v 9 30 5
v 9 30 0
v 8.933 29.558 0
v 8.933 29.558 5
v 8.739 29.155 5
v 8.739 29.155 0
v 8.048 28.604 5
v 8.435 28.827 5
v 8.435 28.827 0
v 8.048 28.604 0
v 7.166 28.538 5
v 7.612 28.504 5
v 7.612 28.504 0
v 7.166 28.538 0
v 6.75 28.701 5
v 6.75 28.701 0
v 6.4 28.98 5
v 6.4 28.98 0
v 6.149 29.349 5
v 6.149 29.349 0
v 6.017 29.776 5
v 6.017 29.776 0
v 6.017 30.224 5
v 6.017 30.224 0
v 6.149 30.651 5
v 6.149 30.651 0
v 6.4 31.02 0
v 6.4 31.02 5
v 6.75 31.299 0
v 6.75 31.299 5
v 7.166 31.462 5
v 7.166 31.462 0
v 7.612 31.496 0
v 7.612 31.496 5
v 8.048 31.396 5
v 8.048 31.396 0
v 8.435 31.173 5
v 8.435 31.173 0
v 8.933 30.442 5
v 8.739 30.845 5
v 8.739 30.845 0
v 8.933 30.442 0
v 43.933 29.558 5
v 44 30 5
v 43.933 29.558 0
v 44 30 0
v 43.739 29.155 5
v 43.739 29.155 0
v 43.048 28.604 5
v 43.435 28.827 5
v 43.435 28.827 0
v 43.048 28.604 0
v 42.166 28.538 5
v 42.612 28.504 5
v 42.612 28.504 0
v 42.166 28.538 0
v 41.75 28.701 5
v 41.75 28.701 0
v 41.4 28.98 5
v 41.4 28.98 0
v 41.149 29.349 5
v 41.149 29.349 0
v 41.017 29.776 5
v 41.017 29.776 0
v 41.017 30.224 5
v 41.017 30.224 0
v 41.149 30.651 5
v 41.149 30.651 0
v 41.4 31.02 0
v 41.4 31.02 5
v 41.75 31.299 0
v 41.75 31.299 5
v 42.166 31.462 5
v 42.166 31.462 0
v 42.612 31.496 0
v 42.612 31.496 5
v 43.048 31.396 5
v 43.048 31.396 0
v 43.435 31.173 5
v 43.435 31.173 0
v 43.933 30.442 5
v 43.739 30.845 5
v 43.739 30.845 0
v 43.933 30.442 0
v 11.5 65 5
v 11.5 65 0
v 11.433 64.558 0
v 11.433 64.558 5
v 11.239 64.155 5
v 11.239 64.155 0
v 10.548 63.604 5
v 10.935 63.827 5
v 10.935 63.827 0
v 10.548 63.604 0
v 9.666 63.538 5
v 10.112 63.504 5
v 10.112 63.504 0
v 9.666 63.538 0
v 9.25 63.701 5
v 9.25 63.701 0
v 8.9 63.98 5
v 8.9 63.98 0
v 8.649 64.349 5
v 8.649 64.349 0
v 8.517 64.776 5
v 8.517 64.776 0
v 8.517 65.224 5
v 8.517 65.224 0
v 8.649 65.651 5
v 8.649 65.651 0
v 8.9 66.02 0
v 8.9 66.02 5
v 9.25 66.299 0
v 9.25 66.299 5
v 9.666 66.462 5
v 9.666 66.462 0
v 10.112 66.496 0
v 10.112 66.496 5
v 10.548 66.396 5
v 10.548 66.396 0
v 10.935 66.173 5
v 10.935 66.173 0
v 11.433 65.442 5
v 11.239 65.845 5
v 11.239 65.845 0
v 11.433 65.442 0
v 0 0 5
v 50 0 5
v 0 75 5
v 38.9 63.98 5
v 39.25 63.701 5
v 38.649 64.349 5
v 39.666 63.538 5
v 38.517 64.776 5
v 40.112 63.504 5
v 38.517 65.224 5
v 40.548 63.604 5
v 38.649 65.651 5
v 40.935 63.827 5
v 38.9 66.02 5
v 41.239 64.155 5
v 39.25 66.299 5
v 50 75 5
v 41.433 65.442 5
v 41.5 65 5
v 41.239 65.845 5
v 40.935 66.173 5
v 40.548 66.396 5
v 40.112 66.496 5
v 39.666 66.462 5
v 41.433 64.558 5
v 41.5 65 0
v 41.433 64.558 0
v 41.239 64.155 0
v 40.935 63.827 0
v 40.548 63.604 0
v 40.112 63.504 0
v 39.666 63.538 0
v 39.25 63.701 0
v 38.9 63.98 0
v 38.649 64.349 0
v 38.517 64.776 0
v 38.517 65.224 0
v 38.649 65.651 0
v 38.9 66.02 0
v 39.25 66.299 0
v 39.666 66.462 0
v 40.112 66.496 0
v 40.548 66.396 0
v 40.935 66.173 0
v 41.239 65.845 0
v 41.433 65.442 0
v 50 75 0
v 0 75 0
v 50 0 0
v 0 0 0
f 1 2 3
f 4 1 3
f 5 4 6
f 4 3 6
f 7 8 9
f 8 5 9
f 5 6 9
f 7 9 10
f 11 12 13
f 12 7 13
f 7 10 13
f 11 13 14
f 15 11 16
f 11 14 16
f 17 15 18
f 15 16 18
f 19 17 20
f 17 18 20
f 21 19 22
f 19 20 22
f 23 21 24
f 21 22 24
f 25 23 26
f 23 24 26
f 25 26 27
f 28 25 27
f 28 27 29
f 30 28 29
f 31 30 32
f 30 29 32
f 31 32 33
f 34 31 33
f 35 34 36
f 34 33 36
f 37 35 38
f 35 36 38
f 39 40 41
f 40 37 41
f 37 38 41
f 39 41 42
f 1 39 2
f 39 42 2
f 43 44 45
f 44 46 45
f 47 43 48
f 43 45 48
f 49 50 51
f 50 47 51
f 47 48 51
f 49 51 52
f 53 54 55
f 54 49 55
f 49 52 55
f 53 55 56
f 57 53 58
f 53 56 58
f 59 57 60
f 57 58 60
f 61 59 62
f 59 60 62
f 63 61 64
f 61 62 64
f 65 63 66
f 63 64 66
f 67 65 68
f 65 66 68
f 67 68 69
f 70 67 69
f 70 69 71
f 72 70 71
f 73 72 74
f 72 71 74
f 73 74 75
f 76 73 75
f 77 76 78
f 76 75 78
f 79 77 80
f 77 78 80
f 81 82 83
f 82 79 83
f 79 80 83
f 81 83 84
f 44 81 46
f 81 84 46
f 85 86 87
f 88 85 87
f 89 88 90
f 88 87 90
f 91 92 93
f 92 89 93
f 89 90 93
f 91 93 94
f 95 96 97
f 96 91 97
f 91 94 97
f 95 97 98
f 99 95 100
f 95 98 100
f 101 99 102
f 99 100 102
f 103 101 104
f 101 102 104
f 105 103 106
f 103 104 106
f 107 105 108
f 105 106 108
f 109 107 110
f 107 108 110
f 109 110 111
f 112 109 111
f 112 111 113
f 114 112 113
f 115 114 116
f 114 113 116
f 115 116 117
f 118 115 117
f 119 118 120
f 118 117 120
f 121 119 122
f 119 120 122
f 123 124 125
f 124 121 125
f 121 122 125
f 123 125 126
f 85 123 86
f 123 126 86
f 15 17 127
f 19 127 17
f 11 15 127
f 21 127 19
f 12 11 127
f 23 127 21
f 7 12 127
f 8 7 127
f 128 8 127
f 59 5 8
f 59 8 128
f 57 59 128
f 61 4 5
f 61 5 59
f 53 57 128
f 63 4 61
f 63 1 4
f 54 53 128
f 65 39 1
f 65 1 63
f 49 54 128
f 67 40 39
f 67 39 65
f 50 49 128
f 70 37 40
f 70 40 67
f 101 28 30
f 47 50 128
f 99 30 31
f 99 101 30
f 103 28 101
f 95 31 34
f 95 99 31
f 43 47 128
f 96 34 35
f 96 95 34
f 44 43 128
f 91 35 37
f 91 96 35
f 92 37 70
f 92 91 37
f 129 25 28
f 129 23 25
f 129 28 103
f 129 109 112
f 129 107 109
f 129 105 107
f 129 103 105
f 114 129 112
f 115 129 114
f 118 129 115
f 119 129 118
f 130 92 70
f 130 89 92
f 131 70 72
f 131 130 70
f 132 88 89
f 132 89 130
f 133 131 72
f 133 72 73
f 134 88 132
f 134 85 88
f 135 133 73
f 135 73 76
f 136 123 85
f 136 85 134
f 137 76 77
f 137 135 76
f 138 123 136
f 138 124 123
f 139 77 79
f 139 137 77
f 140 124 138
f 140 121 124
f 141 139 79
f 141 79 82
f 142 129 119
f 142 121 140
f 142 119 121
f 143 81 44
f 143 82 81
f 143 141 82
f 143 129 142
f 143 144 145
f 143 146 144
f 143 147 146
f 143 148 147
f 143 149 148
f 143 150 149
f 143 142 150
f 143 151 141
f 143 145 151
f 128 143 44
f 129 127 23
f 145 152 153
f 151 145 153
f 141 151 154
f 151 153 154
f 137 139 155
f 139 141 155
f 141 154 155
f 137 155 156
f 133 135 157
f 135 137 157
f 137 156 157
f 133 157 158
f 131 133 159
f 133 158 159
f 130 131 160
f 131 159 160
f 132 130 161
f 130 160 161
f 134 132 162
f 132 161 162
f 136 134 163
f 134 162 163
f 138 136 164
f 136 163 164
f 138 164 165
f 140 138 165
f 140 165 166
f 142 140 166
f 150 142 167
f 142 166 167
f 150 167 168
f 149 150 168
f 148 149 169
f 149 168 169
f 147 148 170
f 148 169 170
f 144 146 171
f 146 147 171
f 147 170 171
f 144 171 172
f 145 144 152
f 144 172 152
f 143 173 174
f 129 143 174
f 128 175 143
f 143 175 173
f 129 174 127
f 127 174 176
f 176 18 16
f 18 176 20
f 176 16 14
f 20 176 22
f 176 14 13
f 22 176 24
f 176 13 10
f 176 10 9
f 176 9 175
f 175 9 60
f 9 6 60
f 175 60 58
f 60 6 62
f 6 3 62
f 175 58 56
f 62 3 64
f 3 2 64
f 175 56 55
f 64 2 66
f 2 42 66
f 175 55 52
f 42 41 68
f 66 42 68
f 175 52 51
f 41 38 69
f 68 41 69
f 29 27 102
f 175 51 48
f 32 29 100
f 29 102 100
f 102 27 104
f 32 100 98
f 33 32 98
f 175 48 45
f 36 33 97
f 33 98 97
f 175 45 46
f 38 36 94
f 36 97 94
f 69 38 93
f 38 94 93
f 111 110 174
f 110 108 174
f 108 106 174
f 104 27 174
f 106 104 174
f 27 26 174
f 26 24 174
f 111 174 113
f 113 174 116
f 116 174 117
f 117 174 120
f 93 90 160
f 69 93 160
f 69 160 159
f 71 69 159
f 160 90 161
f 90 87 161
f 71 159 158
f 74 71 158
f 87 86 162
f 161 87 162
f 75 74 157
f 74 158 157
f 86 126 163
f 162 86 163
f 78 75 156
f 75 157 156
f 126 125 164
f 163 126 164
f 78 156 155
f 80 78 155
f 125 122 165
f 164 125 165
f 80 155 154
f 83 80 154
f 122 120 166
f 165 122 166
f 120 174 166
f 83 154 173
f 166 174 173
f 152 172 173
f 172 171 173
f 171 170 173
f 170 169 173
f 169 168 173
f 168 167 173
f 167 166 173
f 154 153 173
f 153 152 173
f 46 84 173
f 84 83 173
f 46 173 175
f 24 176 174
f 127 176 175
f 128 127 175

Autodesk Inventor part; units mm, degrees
ref_plane "YZ Plane" through (0, 0, 0) normal (1, 0, 0) x (0, 1, 0)
ref_plane "XZ Plane" through (0, 0, 0) normal (0, 1, 0) x (-1, 0, 0)
ref_plane "XY Plane" through (0, 0, 0) normal (0, 0, 1) x (1, 0, 0)
sketch "Sketch1" plane through (0, 0, 0) normal (0, 0, 1) x (1, 0, 0)
  line L0 (0, 0) -> (50, 0)
  line L1 (50, 0) -> (50, 75)
  line L2 (50, 75) -> (0, 75)
  line L3 (0, 75) -> (0, 0)
  line L4 (10, 65) -> (40, 65) construction
  line L5 (40, 65) -> (42.5, 30) construction
  line L6 (42.5, 30) -> (7.5, 30) construction
  line L7 (7.5, 30) -> (10, 65) construction
  line L8 (8.75, 47.5) -> (41.25, 47.5) construction
  line L9 (25, 65) -> (25, 30) construction
  circle A0 centre (10, 65) radius 1.5
  circle A1 centre (7.5, 30) radius 1.5
  circle A2 centre (42.5, 30) radius 1.5
  circle A3 centre (40, 65) radius 1.5
  point P0 (25, 75)
  dimension "d0" = 50
  dimension "d1" = 75
  dimension "d2" = 35
  dimension "d4" = 3
  dimension "d5" = 3
  dimension "d6" = 3
  dimension "d7" = 3
  dimension "d8" = 10
  dimension "d11" = 30
  dimension "d12" = 35
extrude "Extrusion1" add sketch "Sketch1" along normal blind 5
properties part number "GA006" material "ABS Plastic"
